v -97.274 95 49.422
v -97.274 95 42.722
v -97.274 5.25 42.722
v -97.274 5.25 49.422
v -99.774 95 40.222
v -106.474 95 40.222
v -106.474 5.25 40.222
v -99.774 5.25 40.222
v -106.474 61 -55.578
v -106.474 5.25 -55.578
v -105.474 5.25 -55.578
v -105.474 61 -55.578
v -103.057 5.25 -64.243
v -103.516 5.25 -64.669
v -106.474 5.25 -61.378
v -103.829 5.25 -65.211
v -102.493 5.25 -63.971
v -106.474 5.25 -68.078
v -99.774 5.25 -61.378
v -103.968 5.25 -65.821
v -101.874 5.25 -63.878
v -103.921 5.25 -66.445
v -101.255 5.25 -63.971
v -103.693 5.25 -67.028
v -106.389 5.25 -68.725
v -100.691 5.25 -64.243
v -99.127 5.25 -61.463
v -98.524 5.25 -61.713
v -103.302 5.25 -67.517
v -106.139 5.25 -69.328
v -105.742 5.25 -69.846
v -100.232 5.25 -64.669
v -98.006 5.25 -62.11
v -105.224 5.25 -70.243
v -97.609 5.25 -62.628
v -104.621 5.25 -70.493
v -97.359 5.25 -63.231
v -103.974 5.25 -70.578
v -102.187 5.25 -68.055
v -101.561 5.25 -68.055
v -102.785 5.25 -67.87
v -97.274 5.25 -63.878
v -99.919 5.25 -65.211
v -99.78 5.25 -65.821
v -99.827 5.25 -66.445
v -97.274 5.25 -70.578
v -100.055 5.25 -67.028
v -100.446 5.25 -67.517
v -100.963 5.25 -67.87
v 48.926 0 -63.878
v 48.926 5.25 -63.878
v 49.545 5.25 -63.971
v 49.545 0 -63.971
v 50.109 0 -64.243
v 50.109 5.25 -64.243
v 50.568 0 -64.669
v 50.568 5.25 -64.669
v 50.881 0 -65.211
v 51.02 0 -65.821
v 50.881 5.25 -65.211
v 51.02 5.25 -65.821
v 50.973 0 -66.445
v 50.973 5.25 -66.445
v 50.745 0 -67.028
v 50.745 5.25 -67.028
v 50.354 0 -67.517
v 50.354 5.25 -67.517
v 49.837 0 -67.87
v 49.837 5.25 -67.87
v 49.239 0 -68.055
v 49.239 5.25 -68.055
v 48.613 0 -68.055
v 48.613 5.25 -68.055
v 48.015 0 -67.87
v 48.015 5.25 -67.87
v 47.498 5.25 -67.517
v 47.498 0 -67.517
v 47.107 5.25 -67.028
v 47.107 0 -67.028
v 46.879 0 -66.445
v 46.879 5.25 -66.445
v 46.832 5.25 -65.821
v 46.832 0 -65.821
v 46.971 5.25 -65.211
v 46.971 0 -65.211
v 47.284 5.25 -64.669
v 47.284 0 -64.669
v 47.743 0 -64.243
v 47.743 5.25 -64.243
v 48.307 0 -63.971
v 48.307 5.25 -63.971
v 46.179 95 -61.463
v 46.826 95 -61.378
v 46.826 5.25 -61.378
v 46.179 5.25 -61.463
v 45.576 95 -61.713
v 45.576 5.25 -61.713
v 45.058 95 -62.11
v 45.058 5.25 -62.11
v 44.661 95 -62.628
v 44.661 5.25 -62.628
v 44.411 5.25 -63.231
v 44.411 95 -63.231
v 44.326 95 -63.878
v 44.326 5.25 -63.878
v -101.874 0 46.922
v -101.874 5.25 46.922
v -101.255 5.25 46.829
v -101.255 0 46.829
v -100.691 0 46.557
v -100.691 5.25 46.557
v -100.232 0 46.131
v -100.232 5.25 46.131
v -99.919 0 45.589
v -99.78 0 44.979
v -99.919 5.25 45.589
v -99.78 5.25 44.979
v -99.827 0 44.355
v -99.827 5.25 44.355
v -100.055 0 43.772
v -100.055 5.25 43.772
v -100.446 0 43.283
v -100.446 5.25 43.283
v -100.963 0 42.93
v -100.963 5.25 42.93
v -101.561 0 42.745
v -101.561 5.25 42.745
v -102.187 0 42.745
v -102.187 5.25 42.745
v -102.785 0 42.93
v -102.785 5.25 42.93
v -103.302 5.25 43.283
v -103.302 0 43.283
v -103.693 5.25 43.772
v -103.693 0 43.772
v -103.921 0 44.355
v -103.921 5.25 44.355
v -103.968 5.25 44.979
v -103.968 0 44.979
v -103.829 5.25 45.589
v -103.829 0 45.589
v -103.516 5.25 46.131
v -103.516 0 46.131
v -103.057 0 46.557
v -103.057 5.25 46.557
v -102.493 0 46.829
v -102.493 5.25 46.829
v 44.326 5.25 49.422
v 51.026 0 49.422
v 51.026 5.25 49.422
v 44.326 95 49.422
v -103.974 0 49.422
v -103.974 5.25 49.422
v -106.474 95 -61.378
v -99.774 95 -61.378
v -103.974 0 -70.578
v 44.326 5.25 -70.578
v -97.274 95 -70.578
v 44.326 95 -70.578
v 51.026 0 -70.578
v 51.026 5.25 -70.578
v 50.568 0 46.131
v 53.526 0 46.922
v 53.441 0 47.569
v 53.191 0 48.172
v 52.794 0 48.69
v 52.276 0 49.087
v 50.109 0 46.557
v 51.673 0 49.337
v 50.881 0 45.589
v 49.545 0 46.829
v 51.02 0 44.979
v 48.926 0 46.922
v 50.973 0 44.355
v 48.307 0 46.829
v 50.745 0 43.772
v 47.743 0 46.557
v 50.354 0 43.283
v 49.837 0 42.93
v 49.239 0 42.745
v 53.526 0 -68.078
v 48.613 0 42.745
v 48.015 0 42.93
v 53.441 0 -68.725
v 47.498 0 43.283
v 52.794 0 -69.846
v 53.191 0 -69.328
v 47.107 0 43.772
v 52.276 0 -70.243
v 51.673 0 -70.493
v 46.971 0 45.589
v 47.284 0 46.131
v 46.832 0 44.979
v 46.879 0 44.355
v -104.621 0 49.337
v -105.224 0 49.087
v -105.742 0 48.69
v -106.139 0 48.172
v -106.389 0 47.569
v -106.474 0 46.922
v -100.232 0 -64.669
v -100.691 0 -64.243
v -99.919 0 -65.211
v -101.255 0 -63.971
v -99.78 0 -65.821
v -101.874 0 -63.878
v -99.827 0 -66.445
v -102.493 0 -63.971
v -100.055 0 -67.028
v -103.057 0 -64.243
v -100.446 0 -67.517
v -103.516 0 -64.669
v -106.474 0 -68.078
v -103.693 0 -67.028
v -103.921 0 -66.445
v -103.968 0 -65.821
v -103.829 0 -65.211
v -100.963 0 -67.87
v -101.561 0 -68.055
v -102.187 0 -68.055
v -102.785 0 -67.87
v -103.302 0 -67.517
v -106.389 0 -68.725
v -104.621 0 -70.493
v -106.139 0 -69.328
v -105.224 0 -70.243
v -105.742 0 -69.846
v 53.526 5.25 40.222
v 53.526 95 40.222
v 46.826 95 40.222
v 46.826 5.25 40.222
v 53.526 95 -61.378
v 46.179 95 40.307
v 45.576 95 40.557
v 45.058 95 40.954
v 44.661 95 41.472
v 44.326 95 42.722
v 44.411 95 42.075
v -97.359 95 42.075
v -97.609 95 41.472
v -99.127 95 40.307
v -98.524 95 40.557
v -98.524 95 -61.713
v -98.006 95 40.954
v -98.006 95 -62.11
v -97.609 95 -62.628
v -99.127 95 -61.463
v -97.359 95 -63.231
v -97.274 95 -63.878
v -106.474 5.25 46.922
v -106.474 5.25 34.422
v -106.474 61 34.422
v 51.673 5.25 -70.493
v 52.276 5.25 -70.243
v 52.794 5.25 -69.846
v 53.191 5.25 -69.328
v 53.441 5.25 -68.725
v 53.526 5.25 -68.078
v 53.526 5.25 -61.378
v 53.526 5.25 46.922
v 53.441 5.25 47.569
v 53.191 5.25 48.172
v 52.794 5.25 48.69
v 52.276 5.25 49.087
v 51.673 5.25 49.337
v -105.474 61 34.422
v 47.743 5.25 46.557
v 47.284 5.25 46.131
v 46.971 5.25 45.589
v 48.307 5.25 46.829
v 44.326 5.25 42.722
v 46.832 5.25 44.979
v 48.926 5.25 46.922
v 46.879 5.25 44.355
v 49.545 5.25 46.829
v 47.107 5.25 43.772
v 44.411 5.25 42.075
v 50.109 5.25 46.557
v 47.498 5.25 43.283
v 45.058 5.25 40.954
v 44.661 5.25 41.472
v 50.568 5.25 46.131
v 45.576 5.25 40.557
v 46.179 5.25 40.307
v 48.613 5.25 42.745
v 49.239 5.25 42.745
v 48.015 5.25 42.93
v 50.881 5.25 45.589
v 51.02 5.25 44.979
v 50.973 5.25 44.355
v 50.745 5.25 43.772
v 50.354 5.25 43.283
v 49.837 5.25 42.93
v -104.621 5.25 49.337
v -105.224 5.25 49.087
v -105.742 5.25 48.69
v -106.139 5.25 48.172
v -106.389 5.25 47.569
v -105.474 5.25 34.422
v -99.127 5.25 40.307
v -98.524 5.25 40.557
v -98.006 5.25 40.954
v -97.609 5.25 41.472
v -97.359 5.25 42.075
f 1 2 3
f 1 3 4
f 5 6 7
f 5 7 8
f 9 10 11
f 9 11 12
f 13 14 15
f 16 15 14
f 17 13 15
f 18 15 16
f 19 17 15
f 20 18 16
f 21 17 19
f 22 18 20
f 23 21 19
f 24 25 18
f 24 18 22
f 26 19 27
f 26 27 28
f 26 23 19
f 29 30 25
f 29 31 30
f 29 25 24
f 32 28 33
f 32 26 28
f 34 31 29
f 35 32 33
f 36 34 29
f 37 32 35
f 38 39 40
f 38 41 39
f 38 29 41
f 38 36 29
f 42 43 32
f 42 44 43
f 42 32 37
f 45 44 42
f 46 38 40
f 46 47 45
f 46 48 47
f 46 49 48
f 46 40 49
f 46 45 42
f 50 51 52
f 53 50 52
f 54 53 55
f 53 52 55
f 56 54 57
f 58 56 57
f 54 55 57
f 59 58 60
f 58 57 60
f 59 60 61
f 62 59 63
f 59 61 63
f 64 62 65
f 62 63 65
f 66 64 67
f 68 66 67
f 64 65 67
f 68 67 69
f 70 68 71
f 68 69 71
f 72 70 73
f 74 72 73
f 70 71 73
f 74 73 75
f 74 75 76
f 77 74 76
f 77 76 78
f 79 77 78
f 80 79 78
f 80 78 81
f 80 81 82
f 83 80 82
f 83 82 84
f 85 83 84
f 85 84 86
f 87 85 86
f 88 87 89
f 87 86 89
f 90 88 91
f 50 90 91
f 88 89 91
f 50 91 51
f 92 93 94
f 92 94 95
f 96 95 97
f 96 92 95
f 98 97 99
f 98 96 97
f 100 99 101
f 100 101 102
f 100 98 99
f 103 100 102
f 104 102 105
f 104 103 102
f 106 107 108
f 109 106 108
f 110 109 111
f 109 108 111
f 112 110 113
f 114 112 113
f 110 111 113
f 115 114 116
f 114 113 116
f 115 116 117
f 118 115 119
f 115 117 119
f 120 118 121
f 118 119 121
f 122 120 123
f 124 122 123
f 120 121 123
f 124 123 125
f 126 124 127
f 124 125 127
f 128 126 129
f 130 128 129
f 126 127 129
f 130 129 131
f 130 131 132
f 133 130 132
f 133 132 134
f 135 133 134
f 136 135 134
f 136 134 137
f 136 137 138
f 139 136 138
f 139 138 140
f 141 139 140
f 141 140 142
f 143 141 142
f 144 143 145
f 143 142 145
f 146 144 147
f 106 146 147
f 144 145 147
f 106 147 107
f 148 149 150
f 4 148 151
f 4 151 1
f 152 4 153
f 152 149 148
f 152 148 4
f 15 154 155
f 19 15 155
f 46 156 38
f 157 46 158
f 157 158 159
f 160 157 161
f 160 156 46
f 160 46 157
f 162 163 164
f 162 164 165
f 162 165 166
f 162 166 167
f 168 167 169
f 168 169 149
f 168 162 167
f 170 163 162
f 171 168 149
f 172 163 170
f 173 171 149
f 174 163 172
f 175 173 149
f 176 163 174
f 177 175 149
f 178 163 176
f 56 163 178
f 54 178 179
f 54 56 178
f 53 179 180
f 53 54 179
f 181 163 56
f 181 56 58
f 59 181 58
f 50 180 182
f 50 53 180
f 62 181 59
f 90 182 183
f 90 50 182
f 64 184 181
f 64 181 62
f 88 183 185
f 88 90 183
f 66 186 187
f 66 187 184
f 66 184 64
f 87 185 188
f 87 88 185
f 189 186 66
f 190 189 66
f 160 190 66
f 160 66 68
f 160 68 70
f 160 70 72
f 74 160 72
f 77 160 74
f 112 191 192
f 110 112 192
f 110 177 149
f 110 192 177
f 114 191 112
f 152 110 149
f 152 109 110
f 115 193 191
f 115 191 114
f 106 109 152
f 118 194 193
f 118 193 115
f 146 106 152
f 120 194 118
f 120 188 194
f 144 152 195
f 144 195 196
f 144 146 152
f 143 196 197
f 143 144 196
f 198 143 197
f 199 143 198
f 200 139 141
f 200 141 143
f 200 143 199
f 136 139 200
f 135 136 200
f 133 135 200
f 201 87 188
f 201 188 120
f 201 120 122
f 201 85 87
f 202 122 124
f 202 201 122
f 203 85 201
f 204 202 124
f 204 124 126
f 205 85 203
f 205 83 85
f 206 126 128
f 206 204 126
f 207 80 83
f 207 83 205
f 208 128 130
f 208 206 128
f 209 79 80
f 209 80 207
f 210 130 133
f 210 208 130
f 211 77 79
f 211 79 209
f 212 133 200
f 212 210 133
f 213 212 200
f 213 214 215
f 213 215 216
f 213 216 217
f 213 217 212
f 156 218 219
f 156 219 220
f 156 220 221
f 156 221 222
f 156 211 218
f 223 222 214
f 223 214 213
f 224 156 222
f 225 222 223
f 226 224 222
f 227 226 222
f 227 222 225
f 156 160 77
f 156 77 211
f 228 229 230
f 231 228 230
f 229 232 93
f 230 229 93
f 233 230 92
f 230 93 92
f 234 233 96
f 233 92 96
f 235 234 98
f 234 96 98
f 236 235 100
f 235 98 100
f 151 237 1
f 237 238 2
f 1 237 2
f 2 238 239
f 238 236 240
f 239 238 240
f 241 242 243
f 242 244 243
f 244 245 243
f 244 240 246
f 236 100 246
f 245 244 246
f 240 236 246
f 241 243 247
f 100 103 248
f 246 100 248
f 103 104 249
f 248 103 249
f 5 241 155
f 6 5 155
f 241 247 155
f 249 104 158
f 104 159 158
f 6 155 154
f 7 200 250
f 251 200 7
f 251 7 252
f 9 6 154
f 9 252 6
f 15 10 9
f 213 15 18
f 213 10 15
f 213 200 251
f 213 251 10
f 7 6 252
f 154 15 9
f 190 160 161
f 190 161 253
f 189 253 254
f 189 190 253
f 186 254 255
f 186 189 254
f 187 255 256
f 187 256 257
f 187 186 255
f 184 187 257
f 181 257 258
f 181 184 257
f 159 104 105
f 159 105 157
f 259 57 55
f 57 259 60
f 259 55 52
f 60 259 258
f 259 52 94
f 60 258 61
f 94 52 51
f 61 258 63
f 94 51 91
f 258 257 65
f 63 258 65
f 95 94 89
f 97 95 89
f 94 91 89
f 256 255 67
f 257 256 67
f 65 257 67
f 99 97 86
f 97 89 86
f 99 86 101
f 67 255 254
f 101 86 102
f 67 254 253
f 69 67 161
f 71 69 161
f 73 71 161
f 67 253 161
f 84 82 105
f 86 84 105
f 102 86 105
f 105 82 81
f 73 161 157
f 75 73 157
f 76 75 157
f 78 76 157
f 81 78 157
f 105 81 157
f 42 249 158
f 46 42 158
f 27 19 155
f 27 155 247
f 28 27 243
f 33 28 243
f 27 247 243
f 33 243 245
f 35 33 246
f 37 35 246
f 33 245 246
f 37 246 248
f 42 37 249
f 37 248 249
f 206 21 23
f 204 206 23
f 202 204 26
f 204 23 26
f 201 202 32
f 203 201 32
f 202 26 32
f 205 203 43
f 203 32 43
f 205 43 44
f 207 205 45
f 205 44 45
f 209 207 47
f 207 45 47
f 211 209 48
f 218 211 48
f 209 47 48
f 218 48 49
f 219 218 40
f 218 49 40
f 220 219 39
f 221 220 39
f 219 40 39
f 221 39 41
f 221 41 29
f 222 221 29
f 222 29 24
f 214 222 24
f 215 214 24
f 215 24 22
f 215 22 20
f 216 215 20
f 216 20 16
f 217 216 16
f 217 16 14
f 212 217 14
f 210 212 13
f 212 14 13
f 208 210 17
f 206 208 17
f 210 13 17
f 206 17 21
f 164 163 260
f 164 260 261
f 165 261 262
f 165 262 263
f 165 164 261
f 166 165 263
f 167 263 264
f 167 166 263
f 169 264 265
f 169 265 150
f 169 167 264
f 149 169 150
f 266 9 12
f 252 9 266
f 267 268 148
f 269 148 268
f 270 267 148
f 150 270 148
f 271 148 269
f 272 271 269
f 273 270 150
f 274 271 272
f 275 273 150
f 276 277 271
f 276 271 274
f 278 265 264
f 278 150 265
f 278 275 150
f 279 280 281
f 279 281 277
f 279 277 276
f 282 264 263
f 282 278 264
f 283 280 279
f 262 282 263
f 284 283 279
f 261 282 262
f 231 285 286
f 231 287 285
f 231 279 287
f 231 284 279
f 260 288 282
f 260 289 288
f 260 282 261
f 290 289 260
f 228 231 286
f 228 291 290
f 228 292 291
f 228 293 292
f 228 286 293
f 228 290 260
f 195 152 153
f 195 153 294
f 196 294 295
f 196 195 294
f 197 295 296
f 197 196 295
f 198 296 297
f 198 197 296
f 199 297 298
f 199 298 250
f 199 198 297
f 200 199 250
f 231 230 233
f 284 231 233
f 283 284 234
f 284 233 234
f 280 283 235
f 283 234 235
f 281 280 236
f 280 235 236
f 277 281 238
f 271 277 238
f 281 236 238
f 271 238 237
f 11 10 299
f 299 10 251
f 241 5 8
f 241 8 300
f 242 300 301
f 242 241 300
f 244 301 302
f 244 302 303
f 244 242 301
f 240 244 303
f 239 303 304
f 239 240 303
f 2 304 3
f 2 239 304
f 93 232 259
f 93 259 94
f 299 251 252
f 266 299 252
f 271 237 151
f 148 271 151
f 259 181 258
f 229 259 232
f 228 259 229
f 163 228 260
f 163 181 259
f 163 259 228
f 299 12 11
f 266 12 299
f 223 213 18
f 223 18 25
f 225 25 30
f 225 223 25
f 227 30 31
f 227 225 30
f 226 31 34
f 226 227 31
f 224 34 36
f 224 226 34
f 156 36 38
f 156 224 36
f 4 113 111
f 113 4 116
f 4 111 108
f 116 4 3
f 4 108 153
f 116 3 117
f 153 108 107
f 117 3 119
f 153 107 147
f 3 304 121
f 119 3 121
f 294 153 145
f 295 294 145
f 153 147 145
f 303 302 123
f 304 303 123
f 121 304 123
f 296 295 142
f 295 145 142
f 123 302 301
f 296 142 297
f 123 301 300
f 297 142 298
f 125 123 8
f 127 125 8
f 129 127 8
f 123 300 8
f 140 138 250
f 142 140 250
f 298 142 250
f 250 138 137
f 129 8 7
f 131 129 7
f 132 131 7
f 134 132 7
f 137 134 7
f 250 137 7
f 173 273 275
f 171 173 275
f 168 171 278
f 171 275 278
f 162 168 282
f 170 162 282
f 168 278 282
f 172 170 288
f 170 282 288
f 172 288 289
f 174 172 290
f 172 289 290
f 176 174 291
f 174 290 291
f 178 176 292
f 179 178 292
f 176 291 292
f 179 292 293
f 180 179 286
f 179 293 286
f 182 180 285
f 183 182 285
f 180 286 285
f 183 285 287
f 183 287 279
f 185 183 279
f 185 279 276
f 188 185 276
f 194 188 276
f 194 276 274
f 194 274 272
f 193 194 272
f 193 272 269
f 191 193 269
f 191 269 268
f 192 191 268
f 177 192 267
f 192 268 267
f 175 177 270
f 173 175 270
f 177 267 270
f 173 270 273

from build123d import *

# Parameters (mm, degrees)
DODANIE_WYCI_GNI_CIE1_DEPTH = 95
WYTNIJ_WYCI_GNI_CIE2_DEPTH  = 89.75
SZKIC6_R                    = 2.1
WYTNIJ_WYCI_GNI_CIE4_DEPTH  = 5.25
SZKIC7_W                    = 90
SZKIC7_H                    = 55.75
WYTNIJ_WYCI_GNI_CIE6_DEPTH  = 1


with BuildPart() as part:
    # Szkic1 → Dodanie-wyciągnięcie1 (new body)
    with BuildSketch(Plane(origin=(0, 0, 0), x_dir=(1, 0, 0), z_dir=(0, 1, 0))):
        with BuildLine():
            Line((-103.973988439, 70.578034682), (51.026011561, 70.578034682))
            ThreePointArc((51.026011561, 70.578034682), (52.793778514, 69.845801635), (53.526011561, 68.078034682))
            Line((53.526011561, 68.078034682), (53.526011561, -46.921965318))
            ThreePointArc((53.526011561, -46.921965318), (52.793778514, -48.689732271), (51.026011561, -49.421965318))
            Line((51.026011561, -49.421965318), (-103.973988439, -49.421965318))
            ThreePointArc((-103.973988439, -49.421965318), (-105.741755392, -48.689732271), (-106.473988439, -46.921965318))
            Line((-106.473988439, -46.921965318), (-106.473988439, 68.078034682))
            ThreePointArc((-106.473988439, 68.078034682), (-105.741755392, 69.845801635), (-103.973988439, 70.578034682))
        make_face()
    extrude(amount=DODANIE_WYCI_GNI_CIE1_DEPTH)

    # Szkic3 → Wytnij-wyciągnięcie2 (cut)
    with BuildSketch(Plane(origin=(0, 95, 0), x_dir=(1, 0, 0), z_dir=(0, 1, 0))):
        with BuildLine():
            Line((53.526011561, 70.578034682), (53.526011561, 61.378034682))
            Line((53.526011561, 61.378034682), (46.826011561, 61.378034682))
            ThreePointArc((46.826011561, 61.378034682), (45.058244608, 62.110267729), (44.326011561, 63.878034682))
            Line((44.326011561, 63.878034682), (44.326011561, 70.578034682))
            Line((44.326011561, 70.578034682), (53.526011561, 70.578034682))
        make_face()
        with BuildLine():
            Line((-97.273988439, 63.878034682), (-97.273988439, 70.578034682))
            Line((-97.273988439, 70.578034682), (-106.473988439, 70.578034682))
            Line((-106.473988439, 70.578034682), (-106.473988439, 61.378034682))
            Line((-106.473988439, 61.378034682), (-99.773988439, 61.378034682))
            ThreePointArc((-99.773988439, 61.378034682), (-98.006221486, 62.110267729), (-97.273988439, 63.878034682))
        make_face()
        with BuildLine():
            Line((-106.473988439, -49.421965318), (-106.473988439, -40.221965318))
            Line((-106.473988439, -40.221965318), (-99.773988439, -40.221965318))
            ThreePointArc((-99.773988439, -40.221965318), (-98.006221486, -40.954198365), (-97.273988439, -42.721965318))
            Line((-97.273988439, -42.721965318), (-97.273988439, -49.421965318))
            Line((-97.273988439, -49.421965318), (-106.473988439, -49.421965318))
        make_face()
        with BuildLine():
            Line((44.326011561, -42.721965318), (44.326011561, -49.421965318))
            Line((44.326011561, -49.421965318), (53.526011561, -49.421965318))
            Line((53.526011561, -49.421965318), (53.526011561, -40.221965318))
            Line((53.526011561, -40.221965318), (46.826011561, -40.221965318))
            ThreePointArc((46.826011561, -40.221965318), (45.058244608, -40.954198365), (44.326011561, -42.721965318))
        make_face()
    extrude(amount=-WYTNIJ_WYCI_GNI_CIE2_DEPTH, mode=Mode.SUBTRACT)

    # Szkic6 → Wytnij-wyciągnięcie4 (cut)
    with BuildSketch(Plane(origin=(0, 5.25, 0), x_dir=(1, 0, 0), z_dir=(0, 1, 0))):
        with Locations(Location((48.926011561, 65.978034682, 0), (0, 0, 270))):
            Circle(SZKIC6_R)
        with Locations(Location((-101.873988439, 65.978034682, 0), (0, 0, 270))):
            Circle(SZKIC6_R)
        with Locations(Location((-101.873988439, -44.821965318, 0), (0, 0, 270))):
            Circle(SZKIC6_R)
        with Locations(Location((48.926011561, -44.821965318, 0), (0, 0, 270))):
            Circle(SZKIC6_R)
    extrude(amount=-WYTNIJ_WYCI_GNI_CIE4_DEPTH, mode=Mode.SUBTRACT)

    # Szkic7 → Wytnij-wyciągnięcie6 (cut)
    with BuildSketch(Plane.ZY.offset(106.473988439)):
        with Locations((-10.578034682, 33.125)):
            Rectangle(SZKIC7_W, SZKIC7_H)
    extrude(amount=-WYTNIJ_WYCI_GNI_CIE6_DEPTH, mode=Mode.SUBTRACT)


solid = part.part
